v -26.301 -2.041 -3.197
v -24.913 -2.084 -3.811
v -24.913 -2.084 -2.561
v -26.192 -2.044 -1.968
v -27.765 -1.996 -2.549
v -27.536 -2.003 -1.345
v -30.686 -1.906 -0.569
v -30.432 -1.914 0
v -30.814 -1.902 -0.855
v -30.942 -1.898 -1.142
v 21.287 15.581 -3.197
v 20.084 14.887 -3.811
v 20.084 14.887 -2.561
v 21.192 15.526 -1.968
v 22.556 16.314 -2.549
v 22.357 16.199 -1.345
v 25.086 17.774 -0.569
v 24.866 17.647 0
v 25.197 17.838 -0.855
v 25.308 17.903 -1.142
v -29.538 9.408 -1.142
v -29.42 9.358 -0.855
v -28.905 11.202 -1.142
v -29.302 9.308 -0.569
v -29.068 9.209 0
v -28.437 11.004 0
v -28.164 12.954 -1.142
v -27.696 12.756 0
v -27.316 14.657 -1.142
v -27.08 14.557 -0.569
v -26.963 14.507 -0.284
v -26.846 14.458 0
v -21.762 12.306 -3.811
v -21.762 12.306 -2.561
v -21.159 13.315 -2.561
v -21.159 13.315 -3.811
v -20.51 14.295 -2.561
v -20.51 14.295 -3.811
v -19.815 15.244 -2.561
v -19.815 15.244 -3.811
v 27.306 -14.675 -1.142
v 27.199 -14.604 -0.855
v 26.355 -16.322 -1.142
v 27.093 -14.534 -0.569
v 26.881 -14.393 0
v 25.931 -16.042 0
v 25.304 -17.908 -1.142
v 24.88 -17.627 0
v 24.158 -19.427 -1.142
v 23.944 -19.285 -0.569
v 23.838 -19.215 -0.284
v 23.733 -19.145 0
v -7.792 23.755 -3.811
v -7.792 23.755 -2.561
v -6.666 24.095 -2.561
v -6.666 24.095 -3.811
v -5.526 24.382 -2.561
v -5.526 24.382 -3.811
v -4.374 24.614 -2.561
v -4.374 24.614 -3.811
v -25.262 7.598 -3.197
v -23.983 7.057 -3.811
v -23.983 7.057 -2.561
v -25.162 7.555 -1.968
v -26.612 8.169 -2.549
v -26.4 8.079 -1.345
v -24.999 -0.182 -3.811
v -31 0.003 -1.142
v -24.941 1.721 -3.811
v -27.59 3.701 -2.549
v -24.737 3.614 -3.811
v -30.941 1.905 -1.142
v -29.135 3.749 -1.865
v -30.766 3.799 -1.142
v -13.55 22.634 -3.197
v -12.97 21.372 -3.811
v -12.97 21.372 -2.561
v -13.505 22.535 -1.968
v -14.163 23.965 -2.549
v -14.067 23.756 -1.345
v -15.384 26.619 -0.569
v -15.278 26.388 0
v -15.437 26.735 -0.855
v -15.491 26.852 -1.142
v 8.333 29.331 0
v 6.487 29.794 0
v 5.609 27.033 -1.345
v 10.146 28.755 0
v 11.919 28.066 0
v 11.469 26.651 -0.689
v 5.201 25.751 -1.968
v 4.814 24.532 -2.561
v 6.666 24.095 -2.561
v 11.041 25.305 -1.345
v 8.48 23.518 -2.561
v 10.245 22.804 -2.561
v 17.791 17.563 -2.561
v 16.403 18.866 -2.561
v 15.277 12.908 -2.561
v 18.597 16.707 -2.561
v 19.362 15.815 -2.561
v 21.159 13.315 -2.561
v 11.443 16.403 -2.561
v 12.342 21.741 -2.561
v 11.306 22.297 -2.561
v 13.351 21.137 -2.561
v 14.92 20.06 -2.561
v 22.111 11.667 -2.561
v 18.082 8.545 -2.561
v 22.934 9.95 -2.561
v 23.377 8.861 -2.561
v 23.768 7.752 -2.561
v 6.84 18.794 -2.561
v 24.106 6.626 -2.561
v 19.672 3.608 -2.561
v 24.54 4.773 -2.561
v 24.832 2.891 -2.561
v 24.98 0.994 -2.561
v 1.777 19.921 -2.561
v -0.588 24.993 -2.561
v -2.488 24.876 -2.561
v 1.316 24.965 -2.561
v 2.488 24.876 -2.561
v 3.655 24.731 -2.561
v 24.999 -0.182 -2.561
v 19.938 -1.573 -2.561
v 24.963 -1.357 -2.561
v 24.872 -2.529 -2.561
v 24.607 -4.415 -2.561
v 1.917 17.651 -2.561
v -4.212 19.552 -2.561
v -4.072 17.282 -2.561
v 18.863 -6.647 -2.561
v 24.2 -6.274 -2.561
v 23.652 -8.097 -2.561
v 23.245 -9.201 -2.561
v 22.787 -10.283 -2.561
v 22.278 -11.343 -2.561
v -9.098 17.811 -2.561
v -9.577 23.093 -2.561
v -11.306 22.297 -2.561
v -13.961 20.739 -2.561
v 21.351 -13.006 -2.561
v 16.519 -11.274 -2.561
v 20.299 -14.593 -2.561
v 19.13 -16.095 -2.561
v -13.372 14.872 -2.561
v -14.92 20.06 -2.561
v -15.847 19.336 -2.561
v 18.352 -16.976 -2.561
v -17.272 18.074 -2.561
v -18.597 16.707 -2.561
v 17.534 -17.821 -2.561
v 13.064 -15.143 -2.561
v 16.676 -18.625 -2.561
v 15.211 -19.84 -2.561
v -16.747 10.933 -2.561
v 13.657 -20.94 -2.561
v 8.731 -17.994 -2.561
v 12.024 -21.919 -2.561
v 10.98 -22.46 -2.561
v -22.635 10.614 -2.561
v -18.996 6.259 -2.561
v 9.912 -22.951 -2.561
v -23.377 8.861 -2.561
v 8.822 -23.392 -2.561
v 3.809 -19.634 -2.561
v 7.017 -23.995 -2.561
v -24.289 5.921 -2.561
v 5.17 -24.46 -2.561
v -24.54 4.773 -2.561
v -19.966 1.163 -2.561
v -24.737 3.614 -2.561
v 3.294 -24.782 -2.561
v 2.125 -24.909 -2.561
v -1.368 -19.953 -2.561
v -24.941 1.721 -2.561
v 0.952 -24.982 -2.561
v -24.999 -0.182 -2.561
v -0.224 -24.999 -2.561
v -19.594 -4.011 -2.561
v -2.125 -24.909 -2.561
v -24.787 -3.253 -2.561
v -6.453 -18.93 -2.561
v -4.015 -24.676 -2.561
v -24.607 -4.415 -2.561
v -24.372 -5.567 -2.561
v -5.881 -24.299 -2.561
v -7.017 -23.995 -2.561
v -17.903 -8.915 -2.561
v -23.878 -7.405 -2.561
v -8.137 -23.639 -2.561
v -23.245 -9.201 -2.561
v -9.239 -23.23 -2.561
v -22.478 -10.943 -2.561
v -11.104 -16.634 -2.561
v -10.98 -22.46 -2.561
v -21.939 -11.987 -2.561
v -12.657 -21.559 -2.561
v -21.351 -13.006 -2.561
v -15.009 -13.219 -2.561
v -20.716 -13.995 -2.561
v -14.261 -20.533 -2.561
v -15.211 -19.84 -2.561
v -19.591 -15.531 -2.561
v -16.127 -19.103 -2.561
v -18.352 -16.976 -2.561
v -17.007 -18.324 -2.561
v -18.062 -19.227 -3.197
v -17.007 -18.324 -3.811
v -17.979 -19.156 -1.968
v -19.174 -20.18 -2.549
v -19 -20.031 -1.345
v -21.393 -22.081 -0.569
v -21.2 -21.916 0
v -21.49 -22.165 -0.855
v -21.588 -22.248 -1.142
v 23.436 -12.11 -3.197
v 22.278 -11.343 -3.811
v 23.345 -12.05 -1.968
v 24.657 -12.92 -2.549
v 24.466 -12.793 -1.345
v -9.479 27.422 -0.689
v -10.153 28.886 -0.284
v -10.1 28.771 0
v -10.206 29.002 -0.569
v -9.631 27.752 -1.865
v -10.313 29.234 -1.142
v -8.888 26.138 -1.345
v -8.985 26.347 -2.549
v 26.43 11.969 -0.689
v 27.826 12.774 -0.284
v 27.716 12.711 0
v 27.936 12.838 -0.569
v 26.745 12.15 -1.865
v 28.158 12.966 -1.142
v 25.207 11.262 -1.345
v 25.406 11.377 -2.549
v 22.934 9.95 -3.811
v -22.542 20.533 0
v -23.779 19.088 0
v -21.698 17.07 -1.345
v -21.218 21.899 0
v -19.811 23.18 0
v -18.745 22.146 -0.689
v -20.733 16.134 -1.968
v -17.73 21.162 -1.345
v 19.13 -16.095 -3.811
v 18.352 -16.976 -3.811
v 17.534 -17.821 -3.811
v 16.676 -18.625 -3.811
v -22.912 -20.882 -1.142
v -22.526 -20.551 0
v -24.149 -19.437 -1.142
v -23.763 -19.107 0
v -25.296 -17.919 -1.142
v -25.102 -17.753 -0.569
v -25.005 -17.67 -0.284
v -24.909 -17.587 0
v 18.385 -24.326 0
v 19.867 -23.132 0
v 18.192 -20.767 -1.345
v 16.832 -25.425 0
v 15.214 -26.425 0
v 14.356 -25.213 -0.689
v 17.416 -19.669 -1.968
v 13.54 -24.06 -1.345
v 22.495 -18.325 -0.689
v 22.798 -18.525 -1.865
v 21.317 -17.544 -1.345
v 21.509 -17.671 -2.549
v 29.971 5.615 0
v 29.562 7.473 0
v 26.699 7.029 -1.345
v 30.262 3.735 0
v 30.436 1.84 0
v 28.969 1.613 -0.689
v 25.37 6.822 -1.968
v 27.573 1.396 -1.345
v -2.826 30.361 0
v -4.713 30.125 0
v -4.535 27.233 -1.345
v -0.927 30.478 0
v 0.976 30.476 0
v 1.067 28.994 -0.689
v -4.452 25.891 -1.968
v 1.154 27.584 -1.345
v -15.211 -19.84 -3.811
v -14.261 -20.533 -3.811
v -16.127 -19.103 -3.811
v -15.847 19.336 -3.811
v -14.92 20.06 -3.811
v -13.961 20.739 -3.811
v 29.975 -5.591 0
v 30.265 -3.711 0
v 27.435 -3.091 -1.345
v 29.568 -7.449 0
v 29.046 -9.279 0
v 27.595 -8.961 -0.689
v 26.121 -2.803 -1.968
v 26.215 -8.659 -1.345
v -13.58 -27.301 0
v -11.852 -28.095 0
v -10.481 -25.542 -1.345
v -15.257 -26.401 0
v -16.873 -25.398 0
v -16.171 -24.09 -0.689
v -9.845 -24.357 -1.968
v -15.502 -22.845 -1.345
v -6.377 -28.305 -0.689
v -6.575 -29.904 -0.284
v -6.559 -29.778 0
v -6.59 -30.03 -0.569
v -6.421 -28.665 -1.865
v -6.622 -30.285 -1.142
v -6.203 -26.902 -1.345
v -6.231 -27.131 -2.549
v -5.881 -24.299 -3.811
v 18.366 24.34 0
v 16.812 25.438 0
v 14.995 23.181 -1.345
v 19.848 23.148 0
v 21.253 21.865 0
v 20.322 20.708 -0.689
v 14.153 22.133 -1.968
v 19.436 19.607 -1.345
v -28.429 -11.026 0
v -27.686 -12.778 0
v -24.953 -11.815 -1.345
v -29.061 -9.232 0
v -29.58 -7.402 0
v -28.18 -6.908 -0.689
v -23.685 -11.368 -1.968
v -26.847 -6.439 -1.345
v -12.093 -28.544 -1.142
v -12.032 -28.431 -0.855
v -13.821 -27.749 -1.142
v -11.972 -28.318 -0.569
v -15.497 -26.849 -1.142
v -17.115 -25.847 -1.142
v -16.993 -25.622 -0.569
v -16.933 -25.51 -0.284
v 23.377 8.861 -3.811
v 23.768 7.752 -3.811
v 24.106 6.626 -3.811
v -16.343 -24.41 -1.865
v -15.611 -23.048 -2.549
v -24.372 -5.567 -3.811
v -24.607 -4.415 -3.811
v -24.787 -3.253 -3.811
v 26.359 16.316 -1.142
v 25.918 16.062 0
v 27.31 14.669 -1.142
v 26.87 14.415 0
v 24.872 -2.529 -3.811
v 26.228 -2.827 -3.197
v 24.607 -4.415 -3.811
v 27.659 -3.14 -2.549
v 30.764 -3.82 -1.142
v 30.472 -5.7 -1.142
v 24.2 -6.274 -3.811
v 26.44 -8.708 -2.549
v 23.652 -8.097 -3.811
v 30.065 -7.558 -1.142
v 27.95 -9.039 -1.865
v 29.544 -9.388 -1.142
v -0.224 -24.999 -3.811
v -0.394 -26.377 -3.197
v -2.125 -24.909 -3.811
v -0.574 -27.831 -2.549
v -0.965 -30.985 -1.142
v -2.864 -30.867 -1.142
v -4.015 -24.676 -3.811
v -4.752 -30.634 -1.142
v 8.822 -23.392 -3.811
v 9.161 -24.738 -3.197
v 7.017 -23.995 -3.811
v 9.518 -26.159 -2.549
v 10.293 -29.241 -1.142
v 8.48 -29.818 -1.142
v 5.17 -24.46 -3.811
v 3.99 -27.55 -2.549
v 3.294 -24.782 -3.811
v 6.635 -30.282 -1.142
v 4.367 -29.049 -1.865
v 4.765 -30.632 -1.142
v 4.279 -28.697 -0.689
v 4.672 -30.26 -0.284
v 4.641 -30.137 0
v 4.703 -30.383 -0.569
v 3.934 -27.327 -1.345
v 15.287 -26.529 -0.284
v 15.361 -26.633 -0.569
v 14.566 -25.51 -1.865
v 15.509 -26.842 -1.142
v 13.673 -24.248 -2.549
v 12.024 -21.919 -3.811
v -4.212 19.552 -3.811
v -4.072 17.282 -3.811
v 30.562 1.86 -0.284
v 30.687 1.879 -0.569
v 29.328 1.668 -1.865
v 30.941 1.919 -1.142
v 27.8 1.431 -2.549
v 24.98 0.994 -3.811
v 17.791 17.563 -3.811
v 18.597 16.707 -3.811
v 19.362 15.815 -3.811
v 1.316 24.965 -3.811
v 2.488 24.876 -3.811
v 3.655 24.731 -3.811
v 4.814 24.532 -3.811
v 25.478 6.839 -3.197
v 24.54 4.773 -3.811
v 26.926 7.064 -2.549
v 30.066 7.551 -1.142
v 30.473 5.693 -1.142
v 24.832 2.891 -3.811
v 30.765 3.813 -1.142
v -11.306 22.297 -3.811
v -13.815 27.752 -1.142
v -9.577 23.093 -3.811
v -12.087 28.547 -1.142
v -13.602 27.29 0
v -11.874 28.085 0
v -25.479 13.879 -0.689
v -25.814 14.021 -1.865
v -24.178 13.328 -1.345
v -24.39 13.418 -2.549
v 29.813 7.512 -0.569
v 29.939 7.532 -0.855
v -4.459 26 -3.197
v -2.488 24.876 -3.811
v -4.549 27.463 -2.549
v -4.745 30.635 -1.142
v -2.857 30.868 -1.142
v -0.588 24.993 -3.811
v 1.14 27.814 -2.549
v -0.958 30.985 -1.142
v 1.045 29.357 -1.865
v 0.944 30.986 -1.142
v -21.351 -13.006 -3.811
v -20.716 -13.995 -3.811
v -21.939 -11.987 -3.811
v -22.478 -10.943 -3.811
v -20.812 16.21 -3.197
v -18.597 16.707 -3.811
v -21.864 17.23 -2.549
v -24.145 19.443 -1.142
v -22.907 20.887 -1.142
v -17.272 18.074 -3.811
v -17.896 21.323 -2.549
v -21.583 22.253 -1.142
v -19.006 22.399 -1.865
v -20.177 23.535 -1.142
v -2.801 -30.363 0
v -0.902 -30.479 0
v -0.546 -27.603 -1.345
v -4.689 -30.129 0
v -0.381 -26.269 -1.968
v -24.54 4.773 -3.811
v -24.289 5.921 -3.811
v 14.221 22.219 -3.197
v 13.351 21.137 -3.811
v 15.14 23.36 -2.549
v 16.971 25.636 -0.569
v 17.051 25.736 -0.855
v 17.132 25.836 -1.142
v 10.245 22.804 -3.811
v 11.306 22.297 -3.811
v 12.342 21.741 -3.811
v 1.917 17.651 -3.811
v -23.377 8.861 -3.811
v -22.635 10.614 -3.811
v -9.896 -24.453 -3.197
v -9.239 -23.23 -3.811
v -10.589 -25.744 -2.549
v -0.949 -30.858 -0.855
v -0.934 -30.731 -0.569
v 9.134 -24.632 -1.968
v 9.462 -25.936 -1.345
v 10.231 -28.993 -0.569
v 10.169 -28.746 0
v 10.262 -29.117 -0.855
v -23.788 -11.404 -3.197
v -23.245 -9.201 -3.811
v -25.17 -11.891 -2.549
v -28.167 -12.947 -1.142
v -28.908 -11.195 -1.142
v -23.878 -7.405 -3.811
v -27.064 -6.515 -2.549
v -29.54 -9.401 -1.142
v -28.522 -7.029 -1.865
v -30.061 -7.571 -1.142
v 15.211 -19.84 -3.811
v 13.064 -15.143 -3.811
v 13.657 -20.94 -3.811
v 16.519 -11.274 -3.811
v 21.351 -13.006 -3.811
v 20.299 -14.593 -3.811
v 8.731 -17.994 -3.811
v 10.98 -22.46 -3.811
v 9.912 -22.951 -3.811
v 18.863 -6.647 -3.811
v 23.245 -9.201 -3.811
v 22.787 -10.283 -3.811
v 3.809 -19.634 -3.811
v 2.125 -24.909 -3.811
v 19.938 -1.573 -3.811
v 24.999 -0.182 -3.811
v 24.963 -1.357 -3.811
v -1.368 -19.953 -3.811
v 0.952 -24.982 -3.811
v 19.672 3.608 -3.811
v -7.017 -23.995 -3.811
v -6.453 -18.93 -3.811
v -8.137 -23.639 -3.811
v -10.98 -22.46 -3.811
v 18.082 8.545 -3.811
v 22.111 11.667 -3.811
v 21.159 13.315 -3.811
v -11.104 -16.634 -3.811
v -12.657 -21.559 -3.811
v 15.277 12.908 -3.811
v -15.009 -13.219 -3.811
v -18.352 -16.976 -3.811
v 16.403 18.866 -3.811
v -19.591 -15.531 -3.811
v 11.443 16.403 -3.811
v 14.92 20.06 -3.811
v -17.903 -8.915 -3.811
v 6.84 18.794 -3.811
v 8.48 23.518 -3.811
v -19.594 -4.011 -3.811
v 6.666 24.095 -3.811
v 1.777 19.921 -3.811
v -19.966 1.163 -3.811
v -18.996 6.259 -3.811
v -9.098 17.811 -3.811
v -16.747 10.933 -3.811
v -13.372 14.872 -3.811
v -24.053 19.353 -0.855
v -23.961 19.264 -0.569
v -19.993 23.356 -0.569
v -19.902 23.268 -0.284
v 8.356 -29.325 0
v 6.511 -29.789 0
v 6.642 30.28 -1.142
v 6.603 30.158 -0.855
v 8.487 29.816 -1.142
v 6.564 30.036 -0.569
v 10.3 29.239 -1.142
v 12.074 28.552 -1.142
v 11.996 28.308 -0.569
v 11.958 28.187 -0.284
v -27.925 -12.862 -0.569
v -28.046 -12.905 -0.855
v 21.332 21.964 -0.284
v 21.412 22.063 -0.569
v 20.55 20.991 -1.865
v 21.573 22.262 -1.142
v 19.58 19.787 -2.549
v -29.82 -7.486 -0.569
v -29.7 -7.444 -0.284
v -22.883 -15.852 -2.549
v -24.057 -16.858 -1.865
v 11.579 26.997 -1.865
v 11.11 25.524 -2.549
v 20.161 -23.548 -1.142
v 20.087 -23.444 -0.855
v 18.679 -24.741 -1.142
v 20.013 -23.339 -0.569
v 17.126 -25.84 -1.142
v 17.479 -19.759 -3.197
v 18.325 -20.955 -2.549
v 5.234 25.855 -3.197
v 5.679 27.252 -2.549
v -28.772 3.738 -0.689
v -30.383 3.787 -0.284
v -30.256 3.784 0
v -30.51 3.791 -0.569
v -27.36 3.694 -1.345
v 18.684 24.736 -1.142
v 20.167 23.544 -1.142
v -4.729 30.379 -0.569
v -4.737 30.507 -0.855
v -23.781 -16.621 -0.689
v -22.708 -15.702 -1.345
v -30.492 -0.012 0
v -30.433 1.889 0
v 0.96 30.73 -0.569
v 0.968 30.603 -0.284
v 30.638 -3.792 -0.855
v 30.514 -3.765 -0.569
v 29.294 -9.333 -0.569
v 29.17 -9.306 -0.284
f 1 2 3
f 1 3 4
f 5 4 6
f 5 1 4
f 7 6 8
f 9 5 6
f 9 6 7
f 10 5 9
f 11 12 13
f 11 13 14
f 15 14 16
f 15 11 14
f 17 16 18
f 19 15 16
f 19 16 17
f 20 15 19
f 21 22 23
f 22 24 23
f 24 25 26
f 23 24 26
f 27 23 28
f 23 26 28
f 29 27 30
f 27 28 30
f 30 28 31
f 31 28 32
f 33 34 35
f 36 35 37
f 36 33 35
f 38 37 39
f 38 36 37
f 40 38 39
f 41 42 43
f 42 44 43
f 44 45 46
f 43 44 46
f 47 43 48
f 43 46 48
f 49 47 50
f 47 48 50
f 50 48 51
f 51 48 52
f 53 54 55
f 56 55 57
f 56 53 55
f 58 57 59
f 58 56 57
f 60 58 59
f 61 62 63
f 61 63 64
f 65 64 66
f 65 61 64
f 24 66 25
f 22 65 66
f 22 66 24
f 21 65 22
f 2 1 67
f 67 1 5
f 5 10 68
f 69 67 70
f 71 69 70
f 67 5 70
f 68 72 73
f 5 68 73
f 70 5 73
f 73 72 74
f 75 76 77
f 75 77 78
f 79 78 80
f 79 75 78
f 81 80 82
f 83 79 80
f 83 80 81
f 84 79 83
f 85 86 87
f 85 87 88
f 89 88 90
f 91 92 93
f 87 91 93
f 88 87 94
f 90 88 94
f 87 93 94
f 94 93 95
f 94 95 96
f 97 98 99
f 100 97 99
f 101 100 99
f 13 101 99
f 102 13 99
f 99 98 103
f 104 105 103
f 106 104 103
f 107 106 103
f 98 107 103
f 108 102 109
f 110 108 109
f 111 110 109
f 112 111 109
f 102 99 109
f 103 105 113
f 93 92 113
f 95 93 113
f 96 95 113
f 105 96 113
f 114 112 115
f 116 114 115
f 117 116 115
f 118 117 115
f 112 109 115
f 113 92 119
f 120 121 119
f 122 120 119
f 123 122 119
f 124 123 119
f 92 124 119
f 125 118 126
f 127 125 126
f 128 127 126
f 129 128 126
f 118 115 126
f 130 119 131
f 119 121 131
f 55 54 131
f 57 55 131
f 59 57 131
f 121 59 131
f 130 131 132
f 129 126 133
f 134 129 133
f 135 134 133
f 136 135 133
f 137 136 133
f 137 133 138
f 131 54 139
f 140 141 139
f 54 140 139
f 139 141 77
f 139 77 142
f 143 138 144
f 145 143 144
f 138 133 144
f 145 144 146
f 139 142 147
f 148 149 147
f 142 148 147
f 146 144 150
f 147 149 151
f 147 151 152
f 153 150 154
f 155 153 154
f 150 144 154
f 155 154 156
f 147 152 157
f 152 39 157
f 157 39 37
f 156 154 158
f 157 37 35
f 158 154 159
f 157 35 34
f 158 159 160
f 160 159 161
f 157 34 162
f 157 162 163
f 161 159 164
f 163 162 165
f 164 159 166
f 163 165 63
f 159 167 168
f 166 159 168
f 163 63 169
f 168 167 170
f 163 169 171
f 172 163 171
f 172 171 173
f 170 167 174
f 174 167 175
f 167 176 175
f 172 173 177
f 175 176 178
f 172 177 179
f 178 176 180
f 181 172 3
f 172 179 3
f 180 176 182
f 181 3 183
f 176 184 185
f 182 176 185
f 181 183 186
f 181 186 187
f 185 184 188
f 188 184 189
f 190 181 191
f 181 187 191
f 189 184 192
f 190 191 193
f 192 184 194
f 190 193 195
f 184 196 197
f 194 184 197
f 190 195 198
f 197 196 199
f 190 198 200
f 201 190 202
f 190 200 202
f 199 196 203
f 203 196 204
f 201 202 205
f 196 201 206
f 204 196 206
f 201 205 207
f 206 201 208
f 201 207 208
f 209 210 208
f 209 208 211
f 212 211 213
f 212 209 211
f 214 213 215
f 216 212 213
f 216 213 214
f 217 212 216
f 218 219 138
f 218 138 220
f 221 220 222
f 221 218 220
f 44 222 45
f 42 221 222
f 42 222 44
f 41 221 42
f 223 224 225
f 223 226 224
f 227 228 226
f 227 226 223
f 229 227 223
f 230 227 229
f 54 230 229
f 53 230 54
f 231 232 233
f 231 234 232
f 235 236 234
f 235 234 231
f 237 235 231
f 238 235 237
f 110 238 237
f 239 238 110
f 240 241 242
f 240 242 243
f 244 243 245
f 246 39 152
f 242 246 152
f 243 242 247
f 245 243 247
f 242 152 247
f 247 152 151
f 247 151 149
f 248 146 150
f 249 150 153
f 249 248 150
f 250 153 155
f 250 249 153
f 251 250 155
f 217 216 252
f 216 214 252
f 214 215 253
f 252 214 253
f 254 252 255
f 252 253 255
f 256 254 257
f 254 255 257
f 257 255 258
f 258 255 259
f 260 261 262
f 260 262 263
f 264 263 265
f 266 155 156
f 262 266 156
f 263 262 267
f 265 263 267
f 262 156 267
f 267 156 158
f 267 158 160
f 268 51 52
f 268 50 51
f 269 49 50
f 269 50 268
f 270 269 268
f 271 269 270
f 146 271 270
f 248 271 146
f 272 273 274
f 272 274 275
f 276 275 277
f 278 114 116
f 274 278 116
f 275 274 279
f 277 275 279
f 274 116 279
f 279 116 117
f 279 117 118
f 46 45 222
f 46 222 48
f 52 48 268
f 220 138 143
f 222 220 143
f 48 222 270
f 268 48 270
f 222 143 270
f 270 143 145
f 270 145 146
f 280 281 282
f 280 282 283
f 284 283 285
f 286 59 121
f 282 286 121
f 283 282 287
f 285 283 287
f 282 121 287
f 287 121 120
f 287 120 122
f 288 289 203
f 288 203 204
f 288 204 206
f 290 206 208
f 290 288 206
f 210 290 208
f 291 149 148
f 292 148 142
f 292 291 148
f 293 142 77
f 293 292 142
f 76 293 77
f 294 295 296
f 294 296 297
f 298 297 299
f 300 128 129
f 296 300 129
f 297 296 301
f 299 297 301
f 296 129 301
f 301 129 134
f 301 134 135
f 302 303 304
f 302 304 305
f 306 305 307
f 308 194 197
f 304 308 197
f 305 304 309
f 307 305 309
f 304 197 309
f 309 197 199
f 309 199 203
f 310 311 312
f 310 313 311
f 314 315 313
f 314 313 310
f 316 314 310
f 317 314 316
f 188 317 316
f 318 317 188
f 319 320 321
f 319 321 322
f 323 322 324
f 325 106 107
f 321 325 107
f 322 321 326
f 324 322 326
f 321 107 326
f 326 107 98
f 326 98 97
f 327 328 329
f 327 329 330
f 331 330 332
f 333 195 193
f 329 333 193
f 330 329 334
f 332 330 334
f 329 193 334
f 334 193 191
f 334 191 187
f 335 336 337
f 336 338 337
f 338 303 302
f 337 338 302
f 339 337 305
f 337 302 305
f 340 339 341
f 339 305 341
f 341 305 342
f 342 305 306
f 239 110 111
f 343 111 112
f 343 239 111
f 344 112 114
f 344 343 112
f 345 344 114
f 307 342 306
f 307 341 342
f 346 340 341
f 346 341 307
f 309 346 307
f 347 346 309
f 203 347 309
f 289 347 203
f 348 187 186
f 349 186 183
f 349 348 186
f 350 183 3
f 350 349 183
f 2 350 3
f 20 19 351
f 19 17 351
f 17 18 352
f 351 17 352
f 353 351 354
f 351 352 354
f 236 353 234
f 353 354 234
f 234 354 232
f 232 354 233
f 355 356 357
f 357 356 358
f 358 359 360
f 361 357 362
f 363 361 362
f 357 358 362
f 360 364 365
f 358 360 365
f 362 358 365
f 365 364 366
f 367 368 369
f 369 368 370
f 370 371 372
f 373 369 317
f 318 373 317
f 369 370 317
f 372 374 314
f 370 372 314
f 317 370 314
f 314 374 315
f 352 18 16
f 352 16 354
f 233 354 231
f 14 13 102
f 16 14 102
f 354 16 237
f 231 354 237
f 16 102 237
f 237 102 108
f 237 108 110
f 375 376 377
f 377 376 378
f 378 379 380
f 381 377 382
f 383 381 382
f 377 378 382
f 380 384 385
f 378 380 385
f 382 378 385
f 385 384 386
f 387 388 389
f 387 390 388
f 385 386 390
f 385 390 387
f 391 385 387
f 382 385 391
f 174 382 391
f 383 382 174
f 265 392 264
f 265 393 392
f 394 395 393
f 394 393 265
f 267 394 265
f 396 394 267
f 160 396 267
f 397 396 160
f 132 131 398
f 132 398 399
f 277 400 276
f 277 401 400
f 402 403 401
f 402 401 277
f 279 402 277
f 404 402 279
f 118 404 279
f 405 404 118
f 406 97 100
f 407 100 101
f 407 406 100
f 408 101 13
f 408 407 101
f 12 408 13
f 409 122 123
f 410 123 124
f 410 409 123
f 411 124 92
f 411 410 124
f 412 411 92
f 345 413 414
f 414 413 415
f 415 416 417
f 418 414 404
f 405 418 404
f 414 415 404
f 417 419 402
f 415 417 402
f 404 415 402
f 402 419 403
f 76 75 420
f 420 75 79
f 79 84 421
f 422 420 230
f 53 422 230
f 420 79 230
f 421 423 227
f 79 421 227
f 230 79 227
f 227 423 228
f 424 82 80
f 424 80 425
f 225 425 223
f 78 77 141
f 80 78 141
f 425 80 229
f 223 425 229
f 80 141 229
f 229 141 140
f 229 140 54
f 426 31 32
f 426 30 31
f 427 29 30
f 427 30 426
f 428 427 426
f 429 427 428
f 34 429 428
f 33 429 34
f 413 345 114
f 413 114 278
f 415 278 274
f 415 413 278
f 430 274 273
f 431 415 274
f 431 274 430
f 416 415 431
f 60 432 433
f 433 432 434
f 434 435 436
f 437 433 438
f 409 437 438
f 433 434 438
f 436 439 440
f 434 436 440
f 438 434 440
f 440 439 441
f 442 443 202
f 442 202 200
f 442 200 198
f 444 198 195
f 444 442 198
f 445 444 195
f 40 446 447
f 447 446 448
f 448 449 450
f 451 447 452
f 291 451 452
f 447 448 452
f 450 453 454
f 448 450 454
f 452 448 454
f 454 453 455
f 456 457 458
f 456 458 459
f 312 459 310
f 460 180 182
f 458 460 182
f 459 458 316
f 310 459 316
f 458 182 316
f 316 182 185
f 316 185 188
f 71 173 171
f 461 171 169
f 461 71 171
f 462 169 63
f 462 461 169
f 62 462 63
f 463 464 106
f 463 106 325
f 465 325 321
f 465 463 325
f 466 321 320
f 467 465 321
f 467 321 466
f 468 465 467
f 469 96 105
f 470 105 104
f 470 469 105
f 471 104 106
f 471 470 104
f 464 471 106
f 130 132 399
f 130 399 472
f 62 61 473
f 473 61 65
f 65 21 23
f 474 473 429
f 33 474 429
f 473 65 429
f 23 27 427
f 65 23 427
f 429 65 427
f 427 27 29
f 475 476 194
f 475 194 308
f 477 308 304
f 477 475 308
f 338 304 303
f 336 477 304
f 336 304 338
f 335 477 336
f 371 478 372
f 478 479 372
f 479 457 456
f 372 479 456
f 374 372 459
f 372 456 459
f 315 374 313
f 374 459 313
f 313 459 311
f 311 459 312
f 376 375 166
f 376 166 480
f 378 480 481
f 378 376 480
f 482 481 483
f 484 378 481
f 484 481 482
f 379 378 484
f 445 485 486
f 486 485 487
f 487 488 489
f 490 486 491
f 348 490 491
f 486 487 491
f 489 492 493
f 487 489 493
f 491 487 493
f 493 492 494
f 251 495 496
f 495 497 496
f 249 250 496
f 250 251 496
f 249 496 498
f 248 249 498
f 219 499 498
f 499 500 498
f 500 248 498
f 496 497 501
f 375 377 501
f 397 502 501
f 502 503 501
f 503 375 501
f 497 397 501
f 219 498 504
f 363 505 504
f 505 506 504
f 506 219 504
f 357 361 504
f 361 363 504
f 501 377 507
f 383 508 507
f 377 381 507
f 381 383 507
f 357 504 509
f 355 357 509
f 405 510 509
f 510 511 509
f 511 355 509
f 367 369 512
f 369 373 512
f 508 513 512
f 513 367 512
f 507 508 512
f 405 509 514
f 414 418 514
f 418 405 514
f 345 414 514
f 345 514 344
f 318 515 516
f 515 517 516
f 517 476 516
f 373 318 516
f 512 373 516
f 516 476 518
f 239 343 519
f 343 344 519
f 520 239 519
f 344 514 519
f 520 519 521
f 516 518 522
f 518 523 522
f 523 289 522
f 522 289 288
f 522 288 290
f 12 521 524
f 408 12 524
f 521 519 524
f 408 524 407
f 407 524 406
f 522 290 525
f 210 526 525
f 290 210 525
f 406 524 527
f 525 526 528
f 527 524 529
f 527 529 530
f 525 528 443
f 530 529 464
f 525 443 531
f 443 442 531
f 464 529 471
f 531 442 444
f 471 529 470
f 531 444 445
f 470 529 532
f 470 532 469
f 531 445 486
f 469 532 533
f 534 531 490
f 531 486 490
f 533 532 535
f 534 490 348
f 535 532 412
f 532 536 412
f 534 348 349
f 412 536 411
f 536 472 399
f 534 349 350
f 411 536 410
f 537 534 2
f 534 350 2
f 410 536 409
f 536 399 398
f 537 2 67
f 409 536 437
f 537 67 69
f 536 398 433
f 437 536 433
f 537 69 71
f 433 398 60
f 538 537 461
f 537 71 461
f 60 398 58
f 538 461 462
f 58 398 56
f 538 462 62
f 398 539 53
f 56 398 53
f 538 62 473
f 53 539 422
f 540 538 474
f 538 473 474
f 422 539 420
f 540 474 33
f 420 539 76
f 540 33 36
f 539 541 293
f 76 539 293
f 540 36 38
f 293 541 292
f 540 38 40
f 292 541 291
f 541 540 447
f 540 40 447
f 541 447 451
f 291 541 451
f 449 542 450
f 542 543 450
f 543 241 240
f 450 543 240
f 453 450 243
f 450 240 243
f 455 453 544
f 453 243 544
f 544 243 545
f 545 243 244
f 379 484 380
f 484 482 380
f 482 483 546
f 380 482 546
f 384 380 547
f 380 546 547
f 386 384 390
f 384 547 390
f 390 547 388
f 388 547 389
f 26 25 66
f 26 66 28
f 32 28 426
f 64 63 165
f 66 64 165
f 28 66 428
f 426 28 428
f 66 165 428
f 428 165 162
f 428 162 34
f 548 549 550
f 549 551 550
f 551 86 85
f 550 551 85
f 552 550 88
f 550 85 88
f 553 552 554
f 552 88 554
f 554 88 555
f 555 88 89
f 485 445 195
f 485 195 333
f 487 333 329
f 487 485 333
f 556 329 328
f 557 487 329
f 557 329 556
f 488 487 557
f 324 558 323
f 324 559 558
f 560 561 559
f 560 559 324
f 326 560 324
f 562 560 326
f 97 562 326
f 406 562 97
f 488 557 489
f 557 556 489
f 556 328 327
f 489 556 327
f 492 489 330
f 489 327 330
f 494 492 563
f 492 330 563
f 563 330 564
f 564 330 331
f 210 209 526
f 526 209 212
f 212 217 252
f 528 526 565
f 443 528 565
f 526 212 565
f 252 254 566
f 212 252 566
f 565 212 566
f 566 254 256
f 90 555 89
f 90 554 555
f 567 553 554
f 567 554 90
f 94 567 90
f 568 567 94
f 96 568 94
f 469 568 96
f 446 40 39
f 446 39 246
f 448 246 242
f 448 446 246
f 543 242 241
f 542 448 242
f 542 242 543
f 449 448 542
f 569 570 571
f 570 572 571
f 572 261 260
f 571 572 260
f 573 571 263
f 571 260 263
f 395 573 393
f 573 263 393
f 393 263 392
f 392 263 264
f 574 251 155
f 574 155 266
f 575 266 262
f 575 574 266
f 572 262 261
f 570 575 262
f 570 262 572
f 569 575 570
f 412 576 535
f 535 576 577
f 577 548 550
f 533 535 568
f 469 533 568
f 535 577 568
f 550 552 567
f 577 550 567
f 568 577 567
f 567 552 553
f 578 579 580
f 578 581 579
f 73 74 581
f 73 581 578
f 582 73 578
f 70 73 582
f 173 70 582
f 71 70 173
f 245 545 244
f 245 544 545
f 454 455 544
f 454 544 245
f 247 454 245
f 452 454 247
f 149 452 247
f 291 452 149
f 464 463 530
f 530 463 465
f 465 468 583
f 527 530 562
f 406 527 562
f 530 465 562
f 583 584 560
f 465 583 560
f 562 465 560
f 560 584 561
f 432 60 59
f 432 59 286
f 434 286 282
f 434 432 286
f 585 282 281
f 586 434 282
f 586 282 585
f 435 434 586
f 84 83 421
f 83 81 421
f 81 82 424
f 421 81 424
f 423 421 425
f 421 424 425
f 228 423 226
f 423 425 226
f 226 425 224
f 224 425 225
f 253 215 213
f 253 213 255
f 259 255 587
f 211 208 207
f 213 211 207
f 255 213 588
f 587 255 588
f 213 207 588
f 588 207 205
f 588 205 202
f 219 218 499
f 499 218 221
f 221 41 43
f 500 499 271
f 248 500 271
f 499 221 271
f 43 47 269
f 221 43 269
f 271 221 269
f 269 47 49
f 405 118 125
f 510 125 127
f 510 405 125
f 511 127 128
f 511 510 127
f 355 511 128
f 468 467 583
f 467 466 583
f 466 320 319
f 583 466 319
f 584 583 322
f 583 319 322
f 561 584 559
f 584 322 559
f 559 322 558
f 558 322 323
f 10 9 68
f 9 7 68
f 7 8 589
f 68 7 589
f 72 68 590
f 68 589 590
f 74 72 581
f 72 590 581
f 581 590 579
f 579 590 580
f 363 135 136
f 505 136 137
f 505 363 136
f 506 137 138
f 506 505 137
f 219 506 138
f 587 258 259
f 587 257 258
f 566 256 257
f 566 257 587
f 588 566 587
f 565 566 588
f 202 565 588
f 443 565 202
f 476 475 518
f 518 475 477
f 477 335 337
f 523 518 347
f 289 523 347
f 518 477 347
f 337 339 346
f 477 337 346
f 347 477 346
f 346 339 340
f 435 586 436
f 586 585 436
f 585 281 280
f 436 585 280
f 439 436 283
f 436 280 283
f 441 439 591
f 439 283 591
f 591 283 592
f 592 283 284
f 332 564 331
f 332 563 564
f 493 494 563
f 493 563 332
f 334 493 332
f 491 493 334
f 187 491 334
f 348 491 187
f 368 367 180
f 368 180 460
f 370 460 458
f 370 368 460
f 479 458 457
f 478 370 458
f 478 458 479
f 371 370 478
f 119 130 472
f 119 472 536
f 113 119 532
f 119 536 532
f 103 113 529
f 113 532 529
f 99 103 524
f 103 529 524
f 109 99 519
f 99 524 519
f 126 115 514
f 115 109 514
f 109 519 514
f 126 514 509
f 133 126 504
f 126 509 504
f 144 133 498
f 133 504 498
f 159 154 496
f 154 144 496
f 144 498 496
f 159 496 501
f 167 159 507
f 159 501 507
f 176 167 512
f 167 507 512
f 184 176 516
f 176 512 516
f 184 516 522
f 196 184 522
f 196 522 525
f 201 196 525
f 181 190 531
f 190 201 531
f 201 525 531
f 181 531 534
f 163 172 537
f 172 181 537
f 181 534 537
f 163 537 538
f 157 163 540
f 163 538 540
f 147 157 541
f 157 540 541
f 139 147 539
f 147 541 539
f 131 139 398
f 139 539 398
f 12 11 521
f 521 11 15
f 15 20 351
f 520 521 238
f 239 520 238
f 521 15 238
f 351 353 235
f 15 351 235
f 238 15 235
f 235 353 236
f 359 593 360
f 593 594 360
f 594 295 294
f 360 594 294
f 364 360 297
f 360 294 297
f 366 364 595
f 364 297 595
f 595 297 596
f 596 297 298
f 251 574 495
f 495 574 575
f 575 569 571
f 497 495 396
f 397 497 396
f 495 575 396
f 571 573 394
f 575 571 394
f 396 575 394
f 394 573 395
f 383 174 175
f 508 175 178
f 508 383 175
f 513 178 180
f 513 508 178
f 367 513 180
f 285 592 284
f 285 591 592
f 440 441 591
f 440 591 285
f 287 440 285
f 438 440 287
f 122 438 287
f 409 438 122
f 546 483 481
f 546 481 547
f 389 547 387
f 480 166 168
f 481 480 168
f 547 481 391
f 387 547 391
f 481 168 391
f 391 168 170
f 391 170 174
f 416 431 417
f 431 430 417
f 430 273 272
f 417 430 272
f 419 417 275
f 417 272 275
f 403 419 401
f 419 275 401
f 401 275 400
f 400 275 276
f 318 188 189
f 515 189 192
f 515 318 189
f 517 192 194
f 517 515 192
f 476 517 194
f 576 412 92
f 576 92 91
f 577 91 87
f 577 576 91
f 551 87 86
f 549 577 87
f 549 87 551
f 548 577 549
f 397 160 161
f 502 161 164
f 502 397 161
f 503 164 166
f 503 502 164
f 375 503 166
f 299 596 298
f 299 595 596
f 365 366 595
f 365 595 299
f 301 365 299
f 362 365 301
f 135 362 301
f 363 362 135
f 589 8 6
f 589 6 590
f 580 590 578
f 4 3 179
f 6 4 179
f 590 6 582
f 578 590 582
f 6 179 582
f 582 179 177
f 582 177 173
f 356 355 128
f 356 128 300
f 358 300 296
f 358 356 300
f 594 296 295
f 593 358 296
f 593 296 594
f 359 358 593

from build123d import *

# Parameters (mm, degrees)
SKETCH2_OUTSIDE_W        = 81.552
SKETCH2_OUTSIDE_H        = 81.552
SKETCH2_OUTSIDE_R        = 20
CUT_EXTRUDE_DEPTH        = 4.810952862
PATTERN_CIRCULAR_4_COUNT = 17
EXTRUDE_1_DEPTH          = 1.25


with BuildPart() as part:
    # Sketch1 → Base-Extrude (revolve)
    with BuildSketch(Plane.YZ):
        Polygon((0, -3.810952863), (-25, -3.810952863), (-31, -1.142110693), (-30.491981137, 0), (-25, -2.560952863), (0, -2.560952863), align=None)
    revolve(axis=Axis((0, 0, 5.823648763), (0, 0, -1)))

    # Sketch2 outside → Cut-Extrude (cut, through all)
    with BuildSketch(Plane(origin=(-2.40435344, 1.003568156, -3.810952862), x_dir=(-1, 0, 0), z_dir=(0, 0, -1))):
        with Locations((-2.404, -1.004)):
            Rectangle(SKETCH2_OUTSIDE_W, SKETCH2_OUTSIDE_H)
        with BuildLine():
            Line((-22.488842625, 13.883113616), (-27.712443889, 16.898961212))
            ThreePointArc((-27.712443889, 16.898961212), (-29.251140957, 14.496431844), (-30.562443889, 11.96261641))
            Line((-30.562443889, 11.96261641), (-25.338842625, 8.946768814))
            ThreePointArc((-25.338842625, 8.946768814), (19.246281655, -13.503568156), (-22.488842625, 13.883113616))
        make_face(mode=Mode.SUBTRACT)
        with Locations((-2.40435344, -1.003568156)):
            Circle(SKETCH2_OUTSIDE_R)
    extrude(amount=-CUT_EXTRUDE_DEPTH, mode=Mode.SUBTRACT)


with BuildPart() as pattern_circular_4_1:
    # 阵列(圆周)4: pattern copy
    add(part.part.rotate(Axis((0, 0, 0), (0, 0, 1)), 1 * 360 / PATTERN_CIRCULAR_4_COUNT))


with BuildPart() as pattern_circular_4_2:
    # 阵列(圆周)4: pattern copy
    add(part.part.rotate(Axis((0, 0, 0), (0, 0, 1)), 2 * 360 / PATTERN_CIRCULAR_4_COUNT))


with BuildPart() as pattern_circular_4_3:
    # 阵列(圆周)4: pattern copy
    add(part.part.rotate(Axis((0, 0, 0), (0, 0, 1)), 3 * 360 / PATTERN_CIRCULAR_4_COUNT))


with BuildPart() as pattern_circular_4_4:
    # 阵列(圆周)4: pattern copy
    add(part.part.rotate(Axis((0, 0, 0), (0, 0, 1)), 4 * 360 / PATTERN_CIRCULAR_4_COUNT))


with BuildPart() as pattern_circular_4_5:
    # 阵列(圆周)4: pattern copy
    add(part.part.rotate(Axis((0, 0, 0), (0, 0, 1)), 5 * 360 / PATTERN_CIRCULAR_4_COUNT))


with BuildPart() as pattern_circular_4_6:
    # 阵列(圆周)4: pattern copy
    add(part.part.rotate(Axis((0, 0, 0), (0, 0, 1)), 6 * 360 / PATTERN_CIRCULAR_4_COUNT))


with BuildPart() as pattern_circular_4_7:
    # 阵列(圆周)4: pattern copy
    add(part.part.rotate(Axis((0, 0, 0), (0, 0, 1)), 7 * 360 / PATTERN_CIRCULAR_4_COUNT))


with BuildPart() as pattern_circular_4_8:
    # 阵列(圆周)4: pattern copy
    add(part.part.rotate(Axis((0, 0, 0), (0, 0, 1)), 8 * 360 / PATTERN_CIRCULAR_4_COUNT))


with BuildPart() as pattern_circular_4_9:
    # 阵列(圆周)4: pattern copy
    add(part.part.rotate(Axis((0, 0, 0), (0, 0, 1)), 9 * 360 / PATTERN_CIRCULAR_4_COUNT))


with BuildPart() as pattern_circular_4_10:
    # 阵列(圆周)4: pattern copy
    add(part.part.rotate(Axis((0, 0, 0), (0, 0, 1)), 10 * 360 / PATTERN_CIRCULAR_4_COUNT))


with BuildPart() as pattern_circular_4_11:
    # 阵列(圆周)4: pattern copy
    add(part.part.rotate(Axis((0, 0, 0), (0, 0, 1)), 11 * 360 / PATTERN_CIRCULAR_4_COUNT))


with BuildPart() as pattern_circular_4_12:
    # 阵列(圆周)4: pattern copy
    add(part.part.rotate(Axis((0, 0, 0), (0, 0, 1)), 12 * 360 / PATTERN_CIRCULAR_4_COUNT))


with BuildPart() as pattern_circular_4_13:
    # 阵列(圆周)4: pattern copy
    add(part.part.rotate(Axis((0, 0, 0), (0, 0, 1)), 13 * 360 / PATTERN_CIRCULAR_4_COUNT))


with BuildPart() as pattern_circular_4_14:
    # 阵列(圆周)4: pattern copy
    add(part.part.rotate(Axis((0, 0, 0), (0, 0, 1)), 14 * 360 / PATTERN_CIRCULAR_4_COUNT))


with BuildPart() as pattern_circular_4_15:
    # 阵列(圆周)4: pattern copy
    add(part.part.rotate(Axis((0, 0, 0), (0, 0, 1)), 15 * 360 / PATTERN_CIRCULAR_4_COUNT))


with BuildPart() as pattern_circular_4_16:
    # 阵列(圆周)4: pattern copy
    add(part.part.rotate(Axis((0, 0, 0), (0, 0, 1)), 16 * 360 / PATTERN_CIRCULAR_4_COUNT))


with BuildPart() as part_1:
    add(part.part)

    add(pattern_circular_4_1.part)  # 凸台-拉伸1 merges 阵列(圆周)4_1

    add(pattern_circular_4_2.part)  # 凸台-拉伸1 merges 阵列(圆周)4_2

    add(pattern_circular_4_3.part)  # 凸台-拉伸1 merges 阵列(圆周)4_3

    add(pattern_circular_4_4.part)  # 凸台-拉伸1 merges 阵列(圆周)4_4

    add(pattern_circular_4_5.part)  # 凸台-拉伸1 merges 阵列(圆周)4_5

    add(pattern_circular_4_6.part)  # 凸台-拉伸1 merges 阵列(圆周)4_6

    add(pattern_circular_4_7.part)  # 凸台-拉伸1 merges 阵列(圆周)4_7

    add(pattern_circular_4_8.part)  # 凸台-拉伸1 merges 阵列(圆周)4_8

    add(pattern_circular_4_9.part)  # 凸台-拉伸1 merges 阵列(圆周)4_9

    add(pattern_circular_4_10.part)  # 凸台-拉伸1 merges 阵列(圆周)4_10

    add(pattern_circular_4_11.part)  # 凸台-拉伸1 merges 阵列(圆周)4_11

    add(pattern_circular_4_12.part)  # 凸台-拉伸1 merges 阵列(圆周)4_12

    add(pattern_circular_4_13.part)  # 凸台-拉伸1 merges 阵列(圆周)4_13

    add(pattern_circular_4_14.part)  # 凸台-拉伸1 merges 阵列(圆周)4_14

    add(pattern_circular_4_15.part)  # 凸台-拉伸1 merges 阵列(圆周)4_15

    add(pattern_circular_4_16.part)  # 凸台-拉伸1 merges 阵列(圆周)4_16
    # 草图2 → 凸台-拉伸1 (add)
    with BuildSketch(Plane.XY.offset(-2.560952863)):
        with BuildLine():
            Line((1.916994129, 17.651490971), (1.777021869, 19.920898405))
            ThreePointArc((1.777021869, 19.920898405), (-1.231218123, 19.962066575), (-4.211598103, 19.551532969))
            Line((-4.211598103, 19.551532969), (-4.071625844, 17.282125534))
            Line((-4.071625844, 17.282125534), (1.916994129, 17.651490971))
        make_face()
    extrude(amount=-EXTRUDE_1_DEPTH)


solid = part_1.part
